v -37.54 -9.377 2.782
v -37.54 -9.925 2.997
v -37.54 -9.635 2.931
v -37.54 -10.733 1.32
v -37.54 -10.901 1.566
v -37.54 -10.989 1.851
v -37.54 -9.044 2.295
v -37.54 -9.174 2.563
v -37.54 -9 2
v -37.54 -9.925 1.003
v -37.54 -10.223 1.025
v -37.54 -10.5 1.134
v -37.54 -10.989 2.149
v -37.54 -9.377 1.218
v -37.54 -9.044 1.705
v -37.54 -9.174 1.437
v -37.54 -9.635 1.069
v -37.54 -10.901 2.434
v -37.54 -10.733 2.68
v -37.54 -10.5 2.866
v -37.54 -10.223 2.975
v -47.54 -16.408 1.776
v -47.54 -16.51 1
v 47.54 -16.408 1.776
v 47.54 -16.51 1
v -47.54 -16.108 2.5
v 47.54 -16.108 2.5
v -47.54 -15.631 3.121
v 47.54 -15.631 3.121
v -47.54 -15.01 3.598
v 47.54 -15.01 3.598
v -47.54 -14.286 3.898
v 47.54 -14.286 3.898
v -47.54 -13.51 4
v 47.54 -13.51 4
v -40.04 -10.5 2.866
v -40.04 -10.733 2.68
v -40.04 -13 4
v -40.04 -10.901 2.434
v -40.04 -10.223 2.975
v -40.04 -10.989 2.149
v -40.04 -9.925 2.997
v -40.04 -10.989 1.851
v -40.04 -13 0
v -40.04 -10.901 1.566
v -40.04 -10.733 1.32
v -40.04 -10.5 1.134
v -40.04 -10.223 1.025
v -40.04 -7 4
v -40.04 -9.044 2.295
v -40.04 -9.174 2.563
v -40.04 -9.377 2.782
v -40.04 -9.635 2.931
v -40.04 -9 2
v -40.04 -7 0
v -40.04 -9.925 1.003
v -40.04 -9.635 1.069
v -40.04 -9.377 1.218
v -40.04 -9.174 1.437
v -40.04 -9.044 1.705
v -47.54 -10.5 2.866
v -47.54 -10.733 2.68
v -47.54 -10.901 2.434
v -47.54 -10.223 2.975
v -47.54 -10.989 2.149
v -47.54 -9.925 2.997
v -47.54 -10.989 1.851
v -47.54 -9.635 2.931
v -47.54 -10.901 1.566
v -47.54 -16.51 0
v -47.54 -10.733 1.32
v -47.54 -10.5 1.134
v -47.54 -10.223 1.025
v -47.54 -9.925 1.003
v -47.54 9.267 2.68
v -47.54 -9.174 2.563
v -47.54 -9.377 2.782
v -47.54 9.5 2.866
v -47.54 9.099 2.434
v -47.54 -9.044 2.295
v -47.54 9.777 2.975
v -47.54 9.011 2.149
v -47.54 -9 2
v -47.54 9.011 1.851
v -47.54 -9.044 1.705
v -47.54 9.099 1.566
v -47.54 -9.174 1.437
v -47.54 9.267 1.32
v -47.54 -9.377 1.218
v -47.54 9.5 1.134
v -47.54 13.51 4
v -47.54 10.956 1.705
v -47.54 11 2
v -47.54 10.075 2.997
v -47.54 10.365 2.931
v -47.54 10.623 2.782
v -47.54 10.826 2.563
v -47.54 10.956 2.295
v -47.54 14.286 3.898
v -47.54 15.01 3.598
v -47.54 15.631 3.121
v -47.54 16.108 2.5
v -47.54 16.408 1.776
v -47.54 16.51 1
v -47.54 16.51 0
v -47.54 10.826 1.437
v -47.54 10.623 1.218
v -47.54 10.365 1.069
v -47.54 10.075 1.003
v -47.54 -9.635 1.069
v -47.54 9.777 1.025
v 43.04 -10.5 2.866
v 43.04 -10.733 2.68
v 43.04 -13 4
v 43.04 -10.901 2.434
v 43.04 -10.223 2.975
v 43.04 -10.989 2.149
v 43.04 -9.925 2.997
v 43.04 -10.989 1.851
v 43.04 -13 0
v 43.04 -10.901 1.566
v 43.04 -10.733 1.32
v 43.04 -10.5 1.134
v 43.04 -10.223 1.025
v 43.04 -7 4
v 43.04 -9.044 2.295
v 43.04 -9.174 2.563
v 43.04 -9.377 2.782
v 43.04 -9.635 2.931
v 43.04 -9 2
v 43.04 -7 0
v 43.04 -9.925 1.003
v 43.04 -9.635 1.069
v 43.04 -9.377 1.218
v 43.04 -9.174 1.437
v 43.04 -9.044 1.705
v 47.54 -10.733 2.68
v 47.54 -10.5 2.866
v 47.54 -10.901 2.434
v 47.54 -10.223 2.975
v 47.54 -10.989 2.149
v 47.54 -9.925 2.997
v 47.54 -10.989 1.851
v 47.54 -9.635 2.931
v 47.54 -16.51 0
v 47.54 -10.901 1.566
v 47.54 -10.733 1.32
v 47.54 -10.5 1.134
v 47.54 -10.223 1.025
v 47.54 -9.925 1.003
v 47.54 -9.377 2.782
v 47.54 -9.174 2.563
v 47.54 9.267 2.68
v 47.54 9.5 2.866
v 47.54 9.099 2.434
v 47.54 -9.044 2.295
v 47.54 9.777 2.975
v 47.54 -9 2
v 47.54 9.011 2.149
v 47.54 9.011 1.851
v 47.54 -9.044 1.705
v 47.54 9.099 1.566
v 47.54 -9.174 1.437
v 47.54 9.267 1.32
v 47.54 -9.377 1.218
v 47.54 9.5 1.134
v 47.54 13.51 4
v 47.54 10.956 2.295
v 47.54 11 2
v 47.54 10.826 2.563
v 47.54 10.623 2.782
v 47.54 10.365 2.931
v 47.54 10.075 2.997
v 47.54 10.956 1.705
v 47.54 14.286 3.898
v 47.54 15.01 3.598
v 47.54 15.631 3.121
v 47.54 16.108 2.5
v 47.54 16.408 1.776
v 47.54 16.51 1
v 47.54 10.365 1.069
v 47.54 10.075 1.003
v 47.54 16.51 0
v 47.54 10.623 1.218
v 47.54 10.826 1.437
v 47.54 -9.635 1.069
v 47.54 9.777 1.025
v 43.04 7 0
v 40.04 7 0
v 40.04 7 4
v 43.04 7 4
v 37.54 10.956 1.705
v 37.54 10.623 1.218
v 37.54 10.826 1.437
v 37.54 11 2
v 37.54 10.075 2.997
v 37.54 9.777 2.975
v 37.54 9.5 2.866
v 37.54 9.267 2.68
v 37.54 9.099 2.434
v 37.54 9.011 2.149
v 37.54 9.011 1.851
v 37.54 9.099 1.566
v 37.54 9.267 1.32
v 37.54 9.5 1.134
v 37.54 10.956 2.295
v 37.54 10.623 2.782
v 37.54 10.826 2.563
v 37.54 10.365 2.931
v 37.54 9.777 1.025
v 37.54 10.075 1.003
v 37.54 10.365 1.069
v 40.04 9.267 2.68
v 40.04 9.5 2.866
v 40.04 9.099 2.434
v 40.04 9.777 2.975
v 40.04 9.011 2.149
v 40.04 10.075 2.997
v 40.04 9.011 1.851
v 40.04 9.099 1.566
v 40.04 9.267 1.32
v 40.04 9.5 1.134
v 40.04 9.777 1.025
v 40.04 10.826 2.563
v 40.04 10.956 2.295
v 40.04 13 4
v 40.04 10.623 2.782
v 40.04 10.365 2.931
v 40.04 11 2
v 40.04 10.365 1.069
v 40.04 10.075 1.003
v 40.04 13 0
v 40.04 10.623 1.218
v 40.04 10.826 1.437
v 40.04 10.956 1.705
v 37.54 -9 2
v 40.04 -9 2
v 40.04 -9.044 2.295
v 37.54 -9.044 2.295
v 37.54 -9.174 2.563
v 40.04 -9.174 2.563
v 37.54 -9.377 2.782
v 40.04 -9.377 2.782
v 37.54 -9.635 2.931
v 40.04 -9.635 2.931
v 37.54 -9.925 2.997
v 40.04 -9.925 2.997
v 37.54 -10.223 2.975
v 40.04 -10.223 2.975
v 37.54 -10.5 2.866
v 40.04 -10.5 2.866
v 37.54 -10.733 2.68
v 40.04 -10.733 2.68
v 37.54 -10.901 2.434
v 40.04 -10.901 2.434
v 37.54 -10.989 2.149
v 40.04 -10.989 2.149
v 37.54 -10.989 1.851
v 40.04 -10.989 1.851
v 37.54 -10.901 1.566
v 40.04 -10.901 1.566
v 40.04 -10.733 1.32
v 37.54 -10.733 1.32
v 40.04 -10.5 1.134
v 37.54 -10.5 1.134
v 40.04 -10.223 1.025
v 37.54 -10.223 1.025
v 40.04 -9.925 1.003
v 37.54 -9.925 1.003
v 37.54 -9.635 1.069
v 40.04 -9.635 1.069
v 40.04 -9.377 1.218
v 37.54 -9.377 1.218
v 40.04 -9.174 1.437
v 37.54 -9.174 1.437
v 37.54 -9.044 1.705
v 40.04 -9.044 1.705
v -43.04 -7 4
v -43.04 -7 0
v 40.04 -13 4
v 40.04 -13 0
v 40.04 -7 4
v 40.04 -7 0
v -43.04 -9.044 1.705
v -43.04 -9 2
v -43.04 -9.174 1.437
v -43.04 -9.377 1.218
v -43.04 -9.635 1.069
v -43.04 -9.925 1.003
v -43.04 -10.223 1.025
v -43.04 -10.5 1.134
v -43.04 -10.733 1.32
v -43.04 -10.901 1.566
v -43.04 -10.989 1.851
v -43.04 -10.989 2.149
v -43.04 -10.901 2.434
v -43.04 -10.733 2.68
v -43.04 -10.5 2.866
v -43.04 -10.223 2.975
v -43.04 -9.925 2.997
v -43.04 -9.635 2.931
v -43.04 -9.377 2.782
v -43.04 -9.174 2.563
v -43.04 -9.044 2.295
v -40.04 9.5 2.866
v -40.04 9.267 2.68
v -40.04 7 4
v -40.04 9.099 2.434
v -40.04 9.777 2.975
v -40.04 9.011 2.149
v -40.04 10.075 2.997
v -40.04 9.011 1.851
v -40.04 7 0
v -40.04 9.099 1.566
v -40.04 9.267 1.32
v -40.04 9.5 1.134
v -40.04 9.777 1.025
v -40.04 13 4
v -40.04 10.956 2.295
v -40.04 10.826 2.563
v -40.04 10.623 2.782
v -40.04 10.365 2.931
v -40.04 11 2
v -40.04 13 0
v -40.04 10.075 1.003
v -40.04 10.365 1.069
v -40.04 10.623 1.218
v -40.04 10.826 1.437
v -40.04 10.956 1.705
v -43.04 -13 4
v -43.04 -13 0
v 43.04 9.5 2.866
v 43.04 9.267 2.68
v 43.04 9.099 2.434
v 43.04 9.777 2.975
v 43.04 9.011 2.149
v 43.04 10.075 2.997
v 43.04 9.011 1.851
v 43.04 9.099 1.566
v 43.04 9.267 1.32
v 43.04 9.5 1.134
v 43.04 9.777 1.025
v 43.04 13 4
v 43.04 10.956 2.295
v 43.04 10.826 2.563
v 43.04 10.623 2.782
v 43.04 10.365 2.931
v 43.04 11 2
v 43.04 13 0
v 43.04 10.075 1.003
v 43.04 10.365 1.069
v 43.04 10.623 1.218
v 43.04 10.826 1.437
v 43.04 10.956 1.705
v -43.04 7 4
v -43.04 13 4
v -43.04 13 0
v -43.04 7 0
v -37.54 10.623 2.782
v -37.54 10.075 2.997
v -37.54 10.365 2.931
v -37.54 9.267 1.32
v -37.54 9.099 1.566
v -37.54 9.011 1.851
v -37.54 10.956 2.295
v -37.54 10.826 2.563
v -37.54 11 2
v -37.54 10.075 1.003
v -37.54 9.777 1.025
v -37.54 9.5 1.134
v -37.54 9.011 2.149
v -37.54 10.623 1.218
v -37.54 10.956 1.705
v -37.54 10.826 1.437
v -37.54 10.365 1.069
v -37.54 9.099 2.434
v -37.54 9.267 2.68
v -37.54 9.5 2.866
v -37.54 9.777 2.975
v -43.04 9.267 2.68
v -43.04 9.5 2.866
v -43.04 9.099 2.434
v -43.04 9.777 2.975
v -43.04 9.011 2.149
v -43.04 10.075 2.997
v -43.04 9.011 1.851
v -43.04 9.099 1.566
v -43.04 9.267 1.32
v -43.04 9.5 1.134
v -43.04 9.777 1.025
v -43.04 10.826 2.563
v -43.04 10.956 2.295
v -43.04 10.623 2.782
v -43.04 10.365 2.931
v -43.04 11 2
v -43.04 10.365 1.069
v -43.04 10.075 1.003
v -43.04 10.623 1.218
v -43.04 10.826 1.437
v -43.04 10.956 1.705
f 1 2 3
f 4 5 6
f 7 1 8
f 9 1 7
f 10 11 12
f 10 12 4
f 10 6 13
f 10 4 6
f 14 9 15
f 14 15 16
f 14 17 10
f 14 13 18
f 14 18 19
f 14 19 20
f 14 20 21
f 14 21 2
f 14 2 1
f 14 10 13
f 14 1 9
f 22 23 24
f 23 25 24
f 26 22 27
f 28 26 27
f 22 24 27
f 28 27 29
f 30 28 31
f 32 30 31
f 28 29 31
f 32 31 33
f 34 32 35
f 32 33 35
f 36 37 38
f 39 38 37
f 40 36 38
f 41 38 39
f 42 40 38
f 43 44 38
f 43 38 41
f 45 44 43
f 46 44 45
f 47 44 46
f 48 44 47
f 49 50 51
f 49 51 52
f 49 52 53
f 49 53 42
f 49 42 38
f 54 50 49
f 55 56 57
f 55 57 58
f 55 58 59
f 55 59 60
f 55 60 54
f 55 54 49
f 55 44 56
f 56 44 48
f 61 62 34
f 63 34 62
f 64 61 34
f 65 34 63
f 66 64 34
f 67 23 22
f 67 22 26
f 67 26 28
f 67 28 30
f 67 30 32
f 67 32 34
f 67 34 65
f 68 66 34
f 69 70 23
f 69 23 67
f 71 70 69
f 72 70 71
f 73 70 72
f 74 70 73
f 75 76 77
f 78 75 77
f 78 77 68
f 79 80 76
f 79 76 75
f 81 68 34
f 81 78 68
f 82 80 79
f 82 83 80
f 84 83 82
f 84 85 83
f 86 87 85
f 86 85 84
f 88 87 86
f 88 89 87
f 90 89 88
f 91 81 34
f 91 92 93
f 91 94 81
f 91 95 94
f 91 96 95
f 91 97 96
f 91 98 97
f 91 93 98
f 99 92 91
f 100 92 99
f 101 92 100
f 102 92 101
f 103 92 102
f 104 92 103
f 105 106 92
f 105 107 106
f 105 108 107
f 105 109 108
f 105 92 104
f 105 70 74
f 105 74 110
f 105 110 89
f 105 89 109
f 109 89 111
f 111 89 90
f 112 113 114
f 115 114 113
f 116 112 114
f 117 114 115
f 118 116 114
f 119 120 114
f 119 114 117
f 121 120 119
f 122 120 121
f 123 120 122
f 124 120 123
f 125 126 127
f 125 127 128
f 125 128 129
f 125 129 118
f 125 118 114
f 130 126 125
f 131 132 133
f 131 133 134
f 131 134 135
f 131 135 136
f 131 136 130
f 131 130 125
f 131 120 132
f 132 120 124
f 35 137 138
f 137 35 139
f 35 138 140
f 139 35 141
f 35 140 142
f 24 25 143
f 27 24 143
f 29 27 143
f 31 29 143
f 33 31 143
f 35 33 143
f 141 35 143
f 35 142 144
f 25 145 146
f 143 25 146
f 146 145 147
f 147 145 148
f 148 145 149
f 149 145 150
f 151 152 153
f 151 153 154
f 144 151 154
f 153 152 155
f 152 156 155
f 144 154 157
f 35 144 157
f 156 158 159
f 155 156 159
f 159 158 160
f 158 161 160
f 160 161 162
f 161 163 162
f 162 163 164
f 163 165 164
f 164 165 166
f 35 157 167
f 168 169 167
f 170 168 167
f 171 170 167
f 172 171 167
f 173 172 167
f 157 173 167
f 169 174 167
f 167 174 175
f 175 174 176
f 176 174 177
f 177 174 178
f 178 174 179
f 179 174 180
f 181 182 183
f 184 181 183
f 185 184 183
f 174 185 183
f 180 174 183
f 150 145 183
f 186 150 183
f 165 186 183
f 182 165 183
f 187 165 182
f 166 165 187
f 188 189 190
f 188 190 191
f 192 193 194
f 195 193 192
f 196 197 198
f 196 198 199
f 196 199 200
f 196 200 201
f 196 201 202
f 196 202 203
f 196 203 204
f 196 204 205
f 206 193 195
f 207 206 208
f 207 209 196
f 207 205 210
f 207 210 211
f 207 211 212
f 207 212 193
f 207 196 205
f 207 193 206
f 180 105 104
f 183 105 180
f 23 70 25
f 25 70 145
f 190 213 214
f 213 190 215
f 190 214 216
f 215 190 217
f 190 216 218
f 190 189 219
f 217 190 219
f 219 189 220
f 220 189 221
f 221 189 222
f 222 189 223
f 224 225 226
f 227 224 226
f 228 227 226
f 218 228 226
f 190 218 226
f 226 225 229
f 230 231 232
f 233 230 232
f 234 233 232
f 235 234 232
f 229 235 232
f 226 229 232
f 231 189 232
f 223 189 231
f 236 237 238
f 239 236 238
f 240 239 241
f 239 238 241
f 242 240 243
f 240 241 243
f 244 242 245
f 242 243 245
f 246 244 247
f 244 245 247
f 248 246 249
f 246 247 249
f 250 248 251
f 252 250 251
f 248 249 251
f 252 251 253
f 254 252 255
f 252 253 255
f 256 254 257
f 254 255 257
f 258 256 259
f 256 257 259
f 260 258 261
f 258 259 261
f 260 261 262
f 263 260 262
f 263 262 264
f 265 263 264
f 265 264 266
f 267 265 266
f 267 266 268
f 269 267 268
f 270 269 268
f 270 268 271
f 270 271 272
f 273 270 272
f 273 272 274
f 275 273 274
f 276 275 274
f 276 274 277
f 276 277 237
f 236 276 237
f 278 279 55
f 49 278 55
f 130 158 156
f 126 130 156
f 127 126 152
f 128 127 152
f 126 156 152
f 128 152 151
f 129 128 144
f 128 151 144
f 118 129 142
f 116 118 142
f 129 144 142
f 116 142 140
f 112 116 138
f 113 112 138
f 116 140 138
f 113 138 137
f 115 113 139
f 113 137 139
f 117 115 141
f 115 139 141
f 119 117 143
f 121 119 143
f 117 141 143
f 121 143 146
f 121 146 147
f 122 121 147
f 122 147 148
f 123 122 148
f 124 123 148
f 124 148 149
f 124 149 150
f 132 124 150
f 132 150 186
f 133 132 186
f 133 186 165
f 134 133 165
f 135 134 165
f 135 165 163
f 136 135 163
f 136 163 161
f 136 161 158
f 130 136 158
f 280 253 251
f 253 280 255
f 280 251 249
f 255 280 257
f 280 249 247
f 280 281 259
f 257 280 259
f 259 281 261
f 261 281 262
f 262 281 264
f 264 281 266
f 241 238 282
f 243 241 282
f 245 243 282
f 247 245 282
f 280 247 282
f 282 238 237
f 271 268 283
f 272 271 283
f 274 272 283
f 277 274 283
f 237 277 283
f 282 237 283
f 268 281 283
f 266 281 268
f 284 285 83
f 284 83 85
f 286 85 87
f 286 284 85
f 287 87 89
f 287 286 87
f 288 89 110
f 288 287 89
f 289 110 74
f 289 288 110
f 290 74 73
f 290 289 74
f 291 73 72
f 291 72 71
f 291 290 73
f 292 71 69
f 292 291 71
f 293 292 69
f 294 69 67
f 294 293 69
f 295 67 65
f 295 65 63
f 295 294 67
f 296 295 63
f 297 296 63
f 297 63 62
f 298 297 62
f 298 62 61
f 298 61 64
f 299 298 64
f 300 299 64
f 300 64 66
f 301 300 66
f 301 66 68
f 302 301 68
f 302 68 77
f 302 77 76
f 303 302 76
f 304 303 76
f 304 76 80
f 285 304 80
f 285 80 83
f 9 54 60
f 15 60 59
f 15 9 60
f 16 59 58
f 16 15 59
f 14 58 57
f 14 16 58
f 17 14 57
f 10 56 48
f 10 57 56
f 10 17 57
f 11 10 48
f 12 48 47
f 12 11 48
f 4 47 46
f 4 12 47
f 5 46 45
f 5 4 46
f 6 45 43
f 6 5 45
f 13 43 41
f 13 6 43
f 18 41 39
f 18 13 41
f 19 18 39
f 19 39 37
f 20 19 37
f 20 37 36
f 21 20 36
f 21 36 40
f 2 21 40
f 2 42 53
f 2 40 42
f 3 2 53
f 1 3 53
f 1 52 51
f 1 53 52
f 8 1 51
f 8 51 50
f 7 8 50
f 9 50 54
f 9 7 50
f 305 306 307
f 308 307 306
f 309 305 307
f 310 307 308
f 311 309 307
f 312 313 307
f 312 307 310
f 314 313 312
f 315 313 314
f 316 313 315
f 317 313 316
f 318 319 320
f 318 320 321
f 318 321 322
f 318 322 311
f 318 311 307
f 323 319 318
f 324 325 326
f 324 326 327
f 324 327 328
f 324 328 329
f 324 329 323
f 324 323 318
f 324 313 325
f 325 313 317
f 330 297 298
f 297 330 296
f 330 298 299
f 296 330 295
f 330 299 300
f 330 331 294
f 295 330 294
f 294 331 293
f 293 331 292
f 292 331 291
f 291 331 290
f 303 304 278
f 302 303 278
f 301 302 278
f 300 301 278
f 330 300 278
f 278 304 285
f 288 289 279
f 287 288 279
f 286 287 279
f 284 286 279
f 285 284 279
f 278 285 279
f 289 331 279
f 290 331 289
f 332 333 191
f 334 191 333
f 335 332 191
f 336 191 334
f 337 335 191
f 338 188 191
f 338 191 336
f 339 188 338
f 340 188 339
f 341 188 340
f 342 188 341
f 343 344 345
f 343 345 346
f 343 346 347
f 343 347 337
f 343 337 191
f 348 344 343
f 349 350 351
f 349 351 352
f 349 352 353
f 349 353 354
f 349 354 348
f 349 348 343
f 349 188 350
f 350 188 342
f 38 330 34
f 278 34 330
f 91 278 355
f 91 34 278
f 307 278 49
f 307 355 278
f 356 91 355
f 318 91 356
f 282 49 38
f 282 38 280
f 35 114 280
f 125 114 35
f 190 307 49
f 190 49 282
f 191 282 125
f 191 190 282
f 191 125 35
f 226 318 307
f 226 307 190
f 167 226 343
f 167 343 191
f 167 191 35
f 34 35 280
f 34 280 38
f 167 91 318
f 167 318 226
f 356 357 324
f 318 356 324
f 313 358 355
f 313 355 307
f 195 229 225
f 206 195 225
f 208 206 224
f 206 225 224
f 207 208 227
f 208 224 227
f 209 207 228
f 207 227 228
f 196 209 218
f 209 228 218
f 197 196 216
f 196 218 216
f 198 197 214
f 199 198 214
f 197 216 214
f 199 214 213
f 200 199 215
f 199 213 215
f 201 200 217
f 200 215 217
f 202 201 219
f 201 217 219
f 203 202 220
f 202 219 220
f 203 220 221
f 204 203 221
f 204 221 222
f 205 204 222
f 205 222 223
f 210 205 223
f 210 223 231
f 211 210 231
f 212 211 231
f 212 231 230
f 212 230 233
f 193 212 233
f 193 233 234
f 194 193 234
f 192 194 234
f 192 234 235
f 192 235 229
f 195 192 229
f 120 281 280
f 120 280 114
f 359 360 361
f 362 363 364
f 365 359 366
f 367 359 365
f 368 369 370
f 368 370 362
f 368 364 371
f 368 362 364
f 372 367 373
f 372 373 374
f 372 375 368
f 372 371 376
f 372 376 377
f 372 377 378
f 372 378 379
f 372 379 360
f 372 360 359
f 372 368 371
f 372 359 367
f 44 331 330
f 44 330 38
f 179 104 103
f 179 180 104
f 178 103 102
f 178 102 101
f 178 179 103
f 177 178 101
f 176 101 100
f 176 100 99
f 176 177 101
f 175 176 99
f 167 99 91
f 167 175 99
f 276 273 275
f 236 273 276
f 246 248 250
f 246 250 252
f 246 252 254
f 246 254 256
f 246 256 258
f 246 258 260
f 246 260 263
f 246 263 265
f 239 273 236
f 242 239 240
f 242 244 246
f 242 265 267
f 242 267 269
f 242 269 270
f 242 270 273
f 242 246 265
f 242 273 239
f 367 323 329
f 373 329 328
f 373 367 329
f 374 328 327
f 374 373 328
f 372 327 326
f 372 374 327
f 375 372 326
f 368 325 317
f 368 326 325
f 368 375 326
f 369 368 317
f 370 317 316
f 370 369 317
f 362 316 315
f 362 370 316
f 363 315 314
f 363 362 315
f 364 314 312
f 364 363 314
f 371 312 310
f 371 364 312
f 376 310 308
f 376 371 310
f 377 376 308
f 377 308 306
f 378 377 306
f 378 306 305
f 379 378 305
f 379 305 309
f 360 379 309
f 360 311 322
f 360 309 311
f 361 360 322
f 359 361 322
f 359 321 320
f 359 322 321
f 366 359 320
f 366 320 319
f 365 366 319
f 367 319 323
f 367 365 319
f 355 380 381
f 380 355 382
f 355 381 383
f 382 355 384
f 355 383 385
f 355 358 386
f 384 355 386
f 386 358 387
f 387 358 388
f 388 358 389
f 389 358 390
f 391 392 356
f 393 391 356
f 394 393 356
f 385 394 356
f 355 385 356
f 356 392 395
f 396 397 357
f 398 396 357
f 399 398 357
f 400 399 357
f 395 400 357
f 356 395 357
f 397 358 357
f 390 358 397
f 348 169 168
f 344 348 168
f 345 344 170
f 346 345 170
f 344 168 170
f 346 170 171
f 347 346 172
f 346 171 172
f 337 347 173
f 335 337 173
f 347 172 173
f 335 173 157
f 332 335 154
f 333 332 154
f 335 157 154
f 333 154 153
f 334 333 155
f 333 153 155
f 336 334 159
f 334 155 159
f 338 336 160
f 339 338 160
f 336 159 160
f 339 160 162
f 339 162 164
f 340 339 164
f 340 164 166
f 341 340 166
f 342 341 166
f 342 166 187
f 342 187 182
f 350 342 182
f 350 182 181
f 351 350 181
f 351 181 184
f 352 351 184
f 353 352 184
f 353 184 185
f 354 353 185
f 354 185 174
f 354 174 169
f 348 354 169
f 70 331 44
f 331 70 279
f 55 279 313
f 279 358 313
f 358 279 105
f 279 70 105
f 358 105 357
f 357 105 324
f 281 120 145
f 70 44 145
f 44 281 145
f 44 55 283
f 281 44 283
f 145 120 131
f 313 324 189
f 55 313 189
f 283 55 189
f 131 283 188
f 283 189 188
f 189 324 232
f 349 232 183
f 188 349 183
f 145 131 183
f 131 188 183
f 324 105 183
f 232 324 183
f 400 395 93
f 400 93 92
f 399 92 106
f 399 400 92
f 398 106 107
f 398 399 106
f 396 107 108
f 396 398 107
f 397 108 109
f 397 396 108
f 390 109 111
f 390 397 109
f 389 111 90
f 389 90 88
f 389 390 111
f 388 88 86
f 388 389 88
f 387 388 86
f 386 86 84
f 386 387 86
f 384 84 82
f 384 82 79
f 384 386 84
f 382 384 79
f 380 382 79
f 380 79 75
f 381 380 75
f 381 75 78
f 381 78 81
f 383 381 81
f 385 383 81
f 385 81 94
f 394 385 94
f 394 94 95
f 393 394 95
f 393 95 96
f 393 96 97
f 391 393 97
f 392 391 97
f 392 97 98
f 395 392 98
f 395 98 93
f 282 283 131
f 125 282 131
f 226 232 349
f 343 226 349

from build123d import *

# Parameters (mm, degrees)
ESQUISSE1_W             = 95.08
ESQUISSE1_H             = 33.02
ESQUISSE1_W_2           = 3
ESQUISSE1_H_2           = 6
BOSS_EXTRU_1_DEPTH      = 4
CONG_1_R                = 3
ESQUISSE4_R             = 1
ENL_V_MAT_EXTRU_2_DEPTH = 10
ENL_V_START             = -10
ESQUISSE5_R             = 1
ENL_V_MAT_EXTRU_3_DEPTH = 10


with BuildPart() as part:
    # Esquisse1 → Boss.-Extru.1 (new body)
    with BuildSketch(Plane.XY):
        Rectangle(ESQUISSE1_W, ESQUISSE1_H)
        with Locations((-41.54, -10)):
            Rectangle(ESQUISSE1_W_2, ESQUISSE1_H_2, mode=Mode.SUBTRACT)
        with Locations((-41.54, 10)):
            Rectangle(ESQUISSE1_W_2, ESQUISSE1_H_2, mode=Mode.SUBTRACT)
        with Locations((41.54, -10)):
            Rectangle(ESQUISSE1_W_2, ESQUISSE1_H_2, mode=Mode.SUBTRACT)
        with Locations((41.54, 10)):
            Rectangle(ESQUISSE1_W_2, ESQUISSE1_H_2, mode=Mode.SUBTRACT)
    extrude(amount=BOSS_EXTRU_1_DEPTH)

    # Congé1
    cong_1_edges = [part.edges().sort_by_distance(p)[0] for p in [
        (0, -16.51, 4),
        (0, 16.51, 4),
    ]]
    fillet(cong_1_edges, radius=CONG_1_R)

    # Esquisse4 → Enlèv. mat.-Extru.2 (cut)
    with BuildSketch(Plane(origin=(47.54, 0, 0), x_dir=(0, 0, -1), z_dir=(1, 0, 0))):
        with Locations(Location((-2, 10, 0), (0, 0, 90))):
            Circle(ESQUISSE4_R)
        with Locations(Location((-2, -10, 0), (0, 0, 90))):
            Circle(ESQUISSE4_R)
    extrude(amount=-ENL_V_MAT_EXTRU_2_DEPTH, mode=Mode.SUBTRACT)

    # Esquisse5 → Enlèv. mat.-Extru.3 (cut)
    with BuildSketch(Plane.ZY.offset(47.54).offset(ENL_V_START)):
        with Locations(Location((2, 10, 0), (0, 0, 90))):
            Circle(ESQUISSE5_R)
        with Locations(Location((2, -10, 0), (0, 0, 90))):
            Circle(ESQUISSE5_R)
    extrude(amount=ENL_V_MAT_EXTRU_3_DEPTH, mode=Mode.SUBTRACT)


solid = part.part
